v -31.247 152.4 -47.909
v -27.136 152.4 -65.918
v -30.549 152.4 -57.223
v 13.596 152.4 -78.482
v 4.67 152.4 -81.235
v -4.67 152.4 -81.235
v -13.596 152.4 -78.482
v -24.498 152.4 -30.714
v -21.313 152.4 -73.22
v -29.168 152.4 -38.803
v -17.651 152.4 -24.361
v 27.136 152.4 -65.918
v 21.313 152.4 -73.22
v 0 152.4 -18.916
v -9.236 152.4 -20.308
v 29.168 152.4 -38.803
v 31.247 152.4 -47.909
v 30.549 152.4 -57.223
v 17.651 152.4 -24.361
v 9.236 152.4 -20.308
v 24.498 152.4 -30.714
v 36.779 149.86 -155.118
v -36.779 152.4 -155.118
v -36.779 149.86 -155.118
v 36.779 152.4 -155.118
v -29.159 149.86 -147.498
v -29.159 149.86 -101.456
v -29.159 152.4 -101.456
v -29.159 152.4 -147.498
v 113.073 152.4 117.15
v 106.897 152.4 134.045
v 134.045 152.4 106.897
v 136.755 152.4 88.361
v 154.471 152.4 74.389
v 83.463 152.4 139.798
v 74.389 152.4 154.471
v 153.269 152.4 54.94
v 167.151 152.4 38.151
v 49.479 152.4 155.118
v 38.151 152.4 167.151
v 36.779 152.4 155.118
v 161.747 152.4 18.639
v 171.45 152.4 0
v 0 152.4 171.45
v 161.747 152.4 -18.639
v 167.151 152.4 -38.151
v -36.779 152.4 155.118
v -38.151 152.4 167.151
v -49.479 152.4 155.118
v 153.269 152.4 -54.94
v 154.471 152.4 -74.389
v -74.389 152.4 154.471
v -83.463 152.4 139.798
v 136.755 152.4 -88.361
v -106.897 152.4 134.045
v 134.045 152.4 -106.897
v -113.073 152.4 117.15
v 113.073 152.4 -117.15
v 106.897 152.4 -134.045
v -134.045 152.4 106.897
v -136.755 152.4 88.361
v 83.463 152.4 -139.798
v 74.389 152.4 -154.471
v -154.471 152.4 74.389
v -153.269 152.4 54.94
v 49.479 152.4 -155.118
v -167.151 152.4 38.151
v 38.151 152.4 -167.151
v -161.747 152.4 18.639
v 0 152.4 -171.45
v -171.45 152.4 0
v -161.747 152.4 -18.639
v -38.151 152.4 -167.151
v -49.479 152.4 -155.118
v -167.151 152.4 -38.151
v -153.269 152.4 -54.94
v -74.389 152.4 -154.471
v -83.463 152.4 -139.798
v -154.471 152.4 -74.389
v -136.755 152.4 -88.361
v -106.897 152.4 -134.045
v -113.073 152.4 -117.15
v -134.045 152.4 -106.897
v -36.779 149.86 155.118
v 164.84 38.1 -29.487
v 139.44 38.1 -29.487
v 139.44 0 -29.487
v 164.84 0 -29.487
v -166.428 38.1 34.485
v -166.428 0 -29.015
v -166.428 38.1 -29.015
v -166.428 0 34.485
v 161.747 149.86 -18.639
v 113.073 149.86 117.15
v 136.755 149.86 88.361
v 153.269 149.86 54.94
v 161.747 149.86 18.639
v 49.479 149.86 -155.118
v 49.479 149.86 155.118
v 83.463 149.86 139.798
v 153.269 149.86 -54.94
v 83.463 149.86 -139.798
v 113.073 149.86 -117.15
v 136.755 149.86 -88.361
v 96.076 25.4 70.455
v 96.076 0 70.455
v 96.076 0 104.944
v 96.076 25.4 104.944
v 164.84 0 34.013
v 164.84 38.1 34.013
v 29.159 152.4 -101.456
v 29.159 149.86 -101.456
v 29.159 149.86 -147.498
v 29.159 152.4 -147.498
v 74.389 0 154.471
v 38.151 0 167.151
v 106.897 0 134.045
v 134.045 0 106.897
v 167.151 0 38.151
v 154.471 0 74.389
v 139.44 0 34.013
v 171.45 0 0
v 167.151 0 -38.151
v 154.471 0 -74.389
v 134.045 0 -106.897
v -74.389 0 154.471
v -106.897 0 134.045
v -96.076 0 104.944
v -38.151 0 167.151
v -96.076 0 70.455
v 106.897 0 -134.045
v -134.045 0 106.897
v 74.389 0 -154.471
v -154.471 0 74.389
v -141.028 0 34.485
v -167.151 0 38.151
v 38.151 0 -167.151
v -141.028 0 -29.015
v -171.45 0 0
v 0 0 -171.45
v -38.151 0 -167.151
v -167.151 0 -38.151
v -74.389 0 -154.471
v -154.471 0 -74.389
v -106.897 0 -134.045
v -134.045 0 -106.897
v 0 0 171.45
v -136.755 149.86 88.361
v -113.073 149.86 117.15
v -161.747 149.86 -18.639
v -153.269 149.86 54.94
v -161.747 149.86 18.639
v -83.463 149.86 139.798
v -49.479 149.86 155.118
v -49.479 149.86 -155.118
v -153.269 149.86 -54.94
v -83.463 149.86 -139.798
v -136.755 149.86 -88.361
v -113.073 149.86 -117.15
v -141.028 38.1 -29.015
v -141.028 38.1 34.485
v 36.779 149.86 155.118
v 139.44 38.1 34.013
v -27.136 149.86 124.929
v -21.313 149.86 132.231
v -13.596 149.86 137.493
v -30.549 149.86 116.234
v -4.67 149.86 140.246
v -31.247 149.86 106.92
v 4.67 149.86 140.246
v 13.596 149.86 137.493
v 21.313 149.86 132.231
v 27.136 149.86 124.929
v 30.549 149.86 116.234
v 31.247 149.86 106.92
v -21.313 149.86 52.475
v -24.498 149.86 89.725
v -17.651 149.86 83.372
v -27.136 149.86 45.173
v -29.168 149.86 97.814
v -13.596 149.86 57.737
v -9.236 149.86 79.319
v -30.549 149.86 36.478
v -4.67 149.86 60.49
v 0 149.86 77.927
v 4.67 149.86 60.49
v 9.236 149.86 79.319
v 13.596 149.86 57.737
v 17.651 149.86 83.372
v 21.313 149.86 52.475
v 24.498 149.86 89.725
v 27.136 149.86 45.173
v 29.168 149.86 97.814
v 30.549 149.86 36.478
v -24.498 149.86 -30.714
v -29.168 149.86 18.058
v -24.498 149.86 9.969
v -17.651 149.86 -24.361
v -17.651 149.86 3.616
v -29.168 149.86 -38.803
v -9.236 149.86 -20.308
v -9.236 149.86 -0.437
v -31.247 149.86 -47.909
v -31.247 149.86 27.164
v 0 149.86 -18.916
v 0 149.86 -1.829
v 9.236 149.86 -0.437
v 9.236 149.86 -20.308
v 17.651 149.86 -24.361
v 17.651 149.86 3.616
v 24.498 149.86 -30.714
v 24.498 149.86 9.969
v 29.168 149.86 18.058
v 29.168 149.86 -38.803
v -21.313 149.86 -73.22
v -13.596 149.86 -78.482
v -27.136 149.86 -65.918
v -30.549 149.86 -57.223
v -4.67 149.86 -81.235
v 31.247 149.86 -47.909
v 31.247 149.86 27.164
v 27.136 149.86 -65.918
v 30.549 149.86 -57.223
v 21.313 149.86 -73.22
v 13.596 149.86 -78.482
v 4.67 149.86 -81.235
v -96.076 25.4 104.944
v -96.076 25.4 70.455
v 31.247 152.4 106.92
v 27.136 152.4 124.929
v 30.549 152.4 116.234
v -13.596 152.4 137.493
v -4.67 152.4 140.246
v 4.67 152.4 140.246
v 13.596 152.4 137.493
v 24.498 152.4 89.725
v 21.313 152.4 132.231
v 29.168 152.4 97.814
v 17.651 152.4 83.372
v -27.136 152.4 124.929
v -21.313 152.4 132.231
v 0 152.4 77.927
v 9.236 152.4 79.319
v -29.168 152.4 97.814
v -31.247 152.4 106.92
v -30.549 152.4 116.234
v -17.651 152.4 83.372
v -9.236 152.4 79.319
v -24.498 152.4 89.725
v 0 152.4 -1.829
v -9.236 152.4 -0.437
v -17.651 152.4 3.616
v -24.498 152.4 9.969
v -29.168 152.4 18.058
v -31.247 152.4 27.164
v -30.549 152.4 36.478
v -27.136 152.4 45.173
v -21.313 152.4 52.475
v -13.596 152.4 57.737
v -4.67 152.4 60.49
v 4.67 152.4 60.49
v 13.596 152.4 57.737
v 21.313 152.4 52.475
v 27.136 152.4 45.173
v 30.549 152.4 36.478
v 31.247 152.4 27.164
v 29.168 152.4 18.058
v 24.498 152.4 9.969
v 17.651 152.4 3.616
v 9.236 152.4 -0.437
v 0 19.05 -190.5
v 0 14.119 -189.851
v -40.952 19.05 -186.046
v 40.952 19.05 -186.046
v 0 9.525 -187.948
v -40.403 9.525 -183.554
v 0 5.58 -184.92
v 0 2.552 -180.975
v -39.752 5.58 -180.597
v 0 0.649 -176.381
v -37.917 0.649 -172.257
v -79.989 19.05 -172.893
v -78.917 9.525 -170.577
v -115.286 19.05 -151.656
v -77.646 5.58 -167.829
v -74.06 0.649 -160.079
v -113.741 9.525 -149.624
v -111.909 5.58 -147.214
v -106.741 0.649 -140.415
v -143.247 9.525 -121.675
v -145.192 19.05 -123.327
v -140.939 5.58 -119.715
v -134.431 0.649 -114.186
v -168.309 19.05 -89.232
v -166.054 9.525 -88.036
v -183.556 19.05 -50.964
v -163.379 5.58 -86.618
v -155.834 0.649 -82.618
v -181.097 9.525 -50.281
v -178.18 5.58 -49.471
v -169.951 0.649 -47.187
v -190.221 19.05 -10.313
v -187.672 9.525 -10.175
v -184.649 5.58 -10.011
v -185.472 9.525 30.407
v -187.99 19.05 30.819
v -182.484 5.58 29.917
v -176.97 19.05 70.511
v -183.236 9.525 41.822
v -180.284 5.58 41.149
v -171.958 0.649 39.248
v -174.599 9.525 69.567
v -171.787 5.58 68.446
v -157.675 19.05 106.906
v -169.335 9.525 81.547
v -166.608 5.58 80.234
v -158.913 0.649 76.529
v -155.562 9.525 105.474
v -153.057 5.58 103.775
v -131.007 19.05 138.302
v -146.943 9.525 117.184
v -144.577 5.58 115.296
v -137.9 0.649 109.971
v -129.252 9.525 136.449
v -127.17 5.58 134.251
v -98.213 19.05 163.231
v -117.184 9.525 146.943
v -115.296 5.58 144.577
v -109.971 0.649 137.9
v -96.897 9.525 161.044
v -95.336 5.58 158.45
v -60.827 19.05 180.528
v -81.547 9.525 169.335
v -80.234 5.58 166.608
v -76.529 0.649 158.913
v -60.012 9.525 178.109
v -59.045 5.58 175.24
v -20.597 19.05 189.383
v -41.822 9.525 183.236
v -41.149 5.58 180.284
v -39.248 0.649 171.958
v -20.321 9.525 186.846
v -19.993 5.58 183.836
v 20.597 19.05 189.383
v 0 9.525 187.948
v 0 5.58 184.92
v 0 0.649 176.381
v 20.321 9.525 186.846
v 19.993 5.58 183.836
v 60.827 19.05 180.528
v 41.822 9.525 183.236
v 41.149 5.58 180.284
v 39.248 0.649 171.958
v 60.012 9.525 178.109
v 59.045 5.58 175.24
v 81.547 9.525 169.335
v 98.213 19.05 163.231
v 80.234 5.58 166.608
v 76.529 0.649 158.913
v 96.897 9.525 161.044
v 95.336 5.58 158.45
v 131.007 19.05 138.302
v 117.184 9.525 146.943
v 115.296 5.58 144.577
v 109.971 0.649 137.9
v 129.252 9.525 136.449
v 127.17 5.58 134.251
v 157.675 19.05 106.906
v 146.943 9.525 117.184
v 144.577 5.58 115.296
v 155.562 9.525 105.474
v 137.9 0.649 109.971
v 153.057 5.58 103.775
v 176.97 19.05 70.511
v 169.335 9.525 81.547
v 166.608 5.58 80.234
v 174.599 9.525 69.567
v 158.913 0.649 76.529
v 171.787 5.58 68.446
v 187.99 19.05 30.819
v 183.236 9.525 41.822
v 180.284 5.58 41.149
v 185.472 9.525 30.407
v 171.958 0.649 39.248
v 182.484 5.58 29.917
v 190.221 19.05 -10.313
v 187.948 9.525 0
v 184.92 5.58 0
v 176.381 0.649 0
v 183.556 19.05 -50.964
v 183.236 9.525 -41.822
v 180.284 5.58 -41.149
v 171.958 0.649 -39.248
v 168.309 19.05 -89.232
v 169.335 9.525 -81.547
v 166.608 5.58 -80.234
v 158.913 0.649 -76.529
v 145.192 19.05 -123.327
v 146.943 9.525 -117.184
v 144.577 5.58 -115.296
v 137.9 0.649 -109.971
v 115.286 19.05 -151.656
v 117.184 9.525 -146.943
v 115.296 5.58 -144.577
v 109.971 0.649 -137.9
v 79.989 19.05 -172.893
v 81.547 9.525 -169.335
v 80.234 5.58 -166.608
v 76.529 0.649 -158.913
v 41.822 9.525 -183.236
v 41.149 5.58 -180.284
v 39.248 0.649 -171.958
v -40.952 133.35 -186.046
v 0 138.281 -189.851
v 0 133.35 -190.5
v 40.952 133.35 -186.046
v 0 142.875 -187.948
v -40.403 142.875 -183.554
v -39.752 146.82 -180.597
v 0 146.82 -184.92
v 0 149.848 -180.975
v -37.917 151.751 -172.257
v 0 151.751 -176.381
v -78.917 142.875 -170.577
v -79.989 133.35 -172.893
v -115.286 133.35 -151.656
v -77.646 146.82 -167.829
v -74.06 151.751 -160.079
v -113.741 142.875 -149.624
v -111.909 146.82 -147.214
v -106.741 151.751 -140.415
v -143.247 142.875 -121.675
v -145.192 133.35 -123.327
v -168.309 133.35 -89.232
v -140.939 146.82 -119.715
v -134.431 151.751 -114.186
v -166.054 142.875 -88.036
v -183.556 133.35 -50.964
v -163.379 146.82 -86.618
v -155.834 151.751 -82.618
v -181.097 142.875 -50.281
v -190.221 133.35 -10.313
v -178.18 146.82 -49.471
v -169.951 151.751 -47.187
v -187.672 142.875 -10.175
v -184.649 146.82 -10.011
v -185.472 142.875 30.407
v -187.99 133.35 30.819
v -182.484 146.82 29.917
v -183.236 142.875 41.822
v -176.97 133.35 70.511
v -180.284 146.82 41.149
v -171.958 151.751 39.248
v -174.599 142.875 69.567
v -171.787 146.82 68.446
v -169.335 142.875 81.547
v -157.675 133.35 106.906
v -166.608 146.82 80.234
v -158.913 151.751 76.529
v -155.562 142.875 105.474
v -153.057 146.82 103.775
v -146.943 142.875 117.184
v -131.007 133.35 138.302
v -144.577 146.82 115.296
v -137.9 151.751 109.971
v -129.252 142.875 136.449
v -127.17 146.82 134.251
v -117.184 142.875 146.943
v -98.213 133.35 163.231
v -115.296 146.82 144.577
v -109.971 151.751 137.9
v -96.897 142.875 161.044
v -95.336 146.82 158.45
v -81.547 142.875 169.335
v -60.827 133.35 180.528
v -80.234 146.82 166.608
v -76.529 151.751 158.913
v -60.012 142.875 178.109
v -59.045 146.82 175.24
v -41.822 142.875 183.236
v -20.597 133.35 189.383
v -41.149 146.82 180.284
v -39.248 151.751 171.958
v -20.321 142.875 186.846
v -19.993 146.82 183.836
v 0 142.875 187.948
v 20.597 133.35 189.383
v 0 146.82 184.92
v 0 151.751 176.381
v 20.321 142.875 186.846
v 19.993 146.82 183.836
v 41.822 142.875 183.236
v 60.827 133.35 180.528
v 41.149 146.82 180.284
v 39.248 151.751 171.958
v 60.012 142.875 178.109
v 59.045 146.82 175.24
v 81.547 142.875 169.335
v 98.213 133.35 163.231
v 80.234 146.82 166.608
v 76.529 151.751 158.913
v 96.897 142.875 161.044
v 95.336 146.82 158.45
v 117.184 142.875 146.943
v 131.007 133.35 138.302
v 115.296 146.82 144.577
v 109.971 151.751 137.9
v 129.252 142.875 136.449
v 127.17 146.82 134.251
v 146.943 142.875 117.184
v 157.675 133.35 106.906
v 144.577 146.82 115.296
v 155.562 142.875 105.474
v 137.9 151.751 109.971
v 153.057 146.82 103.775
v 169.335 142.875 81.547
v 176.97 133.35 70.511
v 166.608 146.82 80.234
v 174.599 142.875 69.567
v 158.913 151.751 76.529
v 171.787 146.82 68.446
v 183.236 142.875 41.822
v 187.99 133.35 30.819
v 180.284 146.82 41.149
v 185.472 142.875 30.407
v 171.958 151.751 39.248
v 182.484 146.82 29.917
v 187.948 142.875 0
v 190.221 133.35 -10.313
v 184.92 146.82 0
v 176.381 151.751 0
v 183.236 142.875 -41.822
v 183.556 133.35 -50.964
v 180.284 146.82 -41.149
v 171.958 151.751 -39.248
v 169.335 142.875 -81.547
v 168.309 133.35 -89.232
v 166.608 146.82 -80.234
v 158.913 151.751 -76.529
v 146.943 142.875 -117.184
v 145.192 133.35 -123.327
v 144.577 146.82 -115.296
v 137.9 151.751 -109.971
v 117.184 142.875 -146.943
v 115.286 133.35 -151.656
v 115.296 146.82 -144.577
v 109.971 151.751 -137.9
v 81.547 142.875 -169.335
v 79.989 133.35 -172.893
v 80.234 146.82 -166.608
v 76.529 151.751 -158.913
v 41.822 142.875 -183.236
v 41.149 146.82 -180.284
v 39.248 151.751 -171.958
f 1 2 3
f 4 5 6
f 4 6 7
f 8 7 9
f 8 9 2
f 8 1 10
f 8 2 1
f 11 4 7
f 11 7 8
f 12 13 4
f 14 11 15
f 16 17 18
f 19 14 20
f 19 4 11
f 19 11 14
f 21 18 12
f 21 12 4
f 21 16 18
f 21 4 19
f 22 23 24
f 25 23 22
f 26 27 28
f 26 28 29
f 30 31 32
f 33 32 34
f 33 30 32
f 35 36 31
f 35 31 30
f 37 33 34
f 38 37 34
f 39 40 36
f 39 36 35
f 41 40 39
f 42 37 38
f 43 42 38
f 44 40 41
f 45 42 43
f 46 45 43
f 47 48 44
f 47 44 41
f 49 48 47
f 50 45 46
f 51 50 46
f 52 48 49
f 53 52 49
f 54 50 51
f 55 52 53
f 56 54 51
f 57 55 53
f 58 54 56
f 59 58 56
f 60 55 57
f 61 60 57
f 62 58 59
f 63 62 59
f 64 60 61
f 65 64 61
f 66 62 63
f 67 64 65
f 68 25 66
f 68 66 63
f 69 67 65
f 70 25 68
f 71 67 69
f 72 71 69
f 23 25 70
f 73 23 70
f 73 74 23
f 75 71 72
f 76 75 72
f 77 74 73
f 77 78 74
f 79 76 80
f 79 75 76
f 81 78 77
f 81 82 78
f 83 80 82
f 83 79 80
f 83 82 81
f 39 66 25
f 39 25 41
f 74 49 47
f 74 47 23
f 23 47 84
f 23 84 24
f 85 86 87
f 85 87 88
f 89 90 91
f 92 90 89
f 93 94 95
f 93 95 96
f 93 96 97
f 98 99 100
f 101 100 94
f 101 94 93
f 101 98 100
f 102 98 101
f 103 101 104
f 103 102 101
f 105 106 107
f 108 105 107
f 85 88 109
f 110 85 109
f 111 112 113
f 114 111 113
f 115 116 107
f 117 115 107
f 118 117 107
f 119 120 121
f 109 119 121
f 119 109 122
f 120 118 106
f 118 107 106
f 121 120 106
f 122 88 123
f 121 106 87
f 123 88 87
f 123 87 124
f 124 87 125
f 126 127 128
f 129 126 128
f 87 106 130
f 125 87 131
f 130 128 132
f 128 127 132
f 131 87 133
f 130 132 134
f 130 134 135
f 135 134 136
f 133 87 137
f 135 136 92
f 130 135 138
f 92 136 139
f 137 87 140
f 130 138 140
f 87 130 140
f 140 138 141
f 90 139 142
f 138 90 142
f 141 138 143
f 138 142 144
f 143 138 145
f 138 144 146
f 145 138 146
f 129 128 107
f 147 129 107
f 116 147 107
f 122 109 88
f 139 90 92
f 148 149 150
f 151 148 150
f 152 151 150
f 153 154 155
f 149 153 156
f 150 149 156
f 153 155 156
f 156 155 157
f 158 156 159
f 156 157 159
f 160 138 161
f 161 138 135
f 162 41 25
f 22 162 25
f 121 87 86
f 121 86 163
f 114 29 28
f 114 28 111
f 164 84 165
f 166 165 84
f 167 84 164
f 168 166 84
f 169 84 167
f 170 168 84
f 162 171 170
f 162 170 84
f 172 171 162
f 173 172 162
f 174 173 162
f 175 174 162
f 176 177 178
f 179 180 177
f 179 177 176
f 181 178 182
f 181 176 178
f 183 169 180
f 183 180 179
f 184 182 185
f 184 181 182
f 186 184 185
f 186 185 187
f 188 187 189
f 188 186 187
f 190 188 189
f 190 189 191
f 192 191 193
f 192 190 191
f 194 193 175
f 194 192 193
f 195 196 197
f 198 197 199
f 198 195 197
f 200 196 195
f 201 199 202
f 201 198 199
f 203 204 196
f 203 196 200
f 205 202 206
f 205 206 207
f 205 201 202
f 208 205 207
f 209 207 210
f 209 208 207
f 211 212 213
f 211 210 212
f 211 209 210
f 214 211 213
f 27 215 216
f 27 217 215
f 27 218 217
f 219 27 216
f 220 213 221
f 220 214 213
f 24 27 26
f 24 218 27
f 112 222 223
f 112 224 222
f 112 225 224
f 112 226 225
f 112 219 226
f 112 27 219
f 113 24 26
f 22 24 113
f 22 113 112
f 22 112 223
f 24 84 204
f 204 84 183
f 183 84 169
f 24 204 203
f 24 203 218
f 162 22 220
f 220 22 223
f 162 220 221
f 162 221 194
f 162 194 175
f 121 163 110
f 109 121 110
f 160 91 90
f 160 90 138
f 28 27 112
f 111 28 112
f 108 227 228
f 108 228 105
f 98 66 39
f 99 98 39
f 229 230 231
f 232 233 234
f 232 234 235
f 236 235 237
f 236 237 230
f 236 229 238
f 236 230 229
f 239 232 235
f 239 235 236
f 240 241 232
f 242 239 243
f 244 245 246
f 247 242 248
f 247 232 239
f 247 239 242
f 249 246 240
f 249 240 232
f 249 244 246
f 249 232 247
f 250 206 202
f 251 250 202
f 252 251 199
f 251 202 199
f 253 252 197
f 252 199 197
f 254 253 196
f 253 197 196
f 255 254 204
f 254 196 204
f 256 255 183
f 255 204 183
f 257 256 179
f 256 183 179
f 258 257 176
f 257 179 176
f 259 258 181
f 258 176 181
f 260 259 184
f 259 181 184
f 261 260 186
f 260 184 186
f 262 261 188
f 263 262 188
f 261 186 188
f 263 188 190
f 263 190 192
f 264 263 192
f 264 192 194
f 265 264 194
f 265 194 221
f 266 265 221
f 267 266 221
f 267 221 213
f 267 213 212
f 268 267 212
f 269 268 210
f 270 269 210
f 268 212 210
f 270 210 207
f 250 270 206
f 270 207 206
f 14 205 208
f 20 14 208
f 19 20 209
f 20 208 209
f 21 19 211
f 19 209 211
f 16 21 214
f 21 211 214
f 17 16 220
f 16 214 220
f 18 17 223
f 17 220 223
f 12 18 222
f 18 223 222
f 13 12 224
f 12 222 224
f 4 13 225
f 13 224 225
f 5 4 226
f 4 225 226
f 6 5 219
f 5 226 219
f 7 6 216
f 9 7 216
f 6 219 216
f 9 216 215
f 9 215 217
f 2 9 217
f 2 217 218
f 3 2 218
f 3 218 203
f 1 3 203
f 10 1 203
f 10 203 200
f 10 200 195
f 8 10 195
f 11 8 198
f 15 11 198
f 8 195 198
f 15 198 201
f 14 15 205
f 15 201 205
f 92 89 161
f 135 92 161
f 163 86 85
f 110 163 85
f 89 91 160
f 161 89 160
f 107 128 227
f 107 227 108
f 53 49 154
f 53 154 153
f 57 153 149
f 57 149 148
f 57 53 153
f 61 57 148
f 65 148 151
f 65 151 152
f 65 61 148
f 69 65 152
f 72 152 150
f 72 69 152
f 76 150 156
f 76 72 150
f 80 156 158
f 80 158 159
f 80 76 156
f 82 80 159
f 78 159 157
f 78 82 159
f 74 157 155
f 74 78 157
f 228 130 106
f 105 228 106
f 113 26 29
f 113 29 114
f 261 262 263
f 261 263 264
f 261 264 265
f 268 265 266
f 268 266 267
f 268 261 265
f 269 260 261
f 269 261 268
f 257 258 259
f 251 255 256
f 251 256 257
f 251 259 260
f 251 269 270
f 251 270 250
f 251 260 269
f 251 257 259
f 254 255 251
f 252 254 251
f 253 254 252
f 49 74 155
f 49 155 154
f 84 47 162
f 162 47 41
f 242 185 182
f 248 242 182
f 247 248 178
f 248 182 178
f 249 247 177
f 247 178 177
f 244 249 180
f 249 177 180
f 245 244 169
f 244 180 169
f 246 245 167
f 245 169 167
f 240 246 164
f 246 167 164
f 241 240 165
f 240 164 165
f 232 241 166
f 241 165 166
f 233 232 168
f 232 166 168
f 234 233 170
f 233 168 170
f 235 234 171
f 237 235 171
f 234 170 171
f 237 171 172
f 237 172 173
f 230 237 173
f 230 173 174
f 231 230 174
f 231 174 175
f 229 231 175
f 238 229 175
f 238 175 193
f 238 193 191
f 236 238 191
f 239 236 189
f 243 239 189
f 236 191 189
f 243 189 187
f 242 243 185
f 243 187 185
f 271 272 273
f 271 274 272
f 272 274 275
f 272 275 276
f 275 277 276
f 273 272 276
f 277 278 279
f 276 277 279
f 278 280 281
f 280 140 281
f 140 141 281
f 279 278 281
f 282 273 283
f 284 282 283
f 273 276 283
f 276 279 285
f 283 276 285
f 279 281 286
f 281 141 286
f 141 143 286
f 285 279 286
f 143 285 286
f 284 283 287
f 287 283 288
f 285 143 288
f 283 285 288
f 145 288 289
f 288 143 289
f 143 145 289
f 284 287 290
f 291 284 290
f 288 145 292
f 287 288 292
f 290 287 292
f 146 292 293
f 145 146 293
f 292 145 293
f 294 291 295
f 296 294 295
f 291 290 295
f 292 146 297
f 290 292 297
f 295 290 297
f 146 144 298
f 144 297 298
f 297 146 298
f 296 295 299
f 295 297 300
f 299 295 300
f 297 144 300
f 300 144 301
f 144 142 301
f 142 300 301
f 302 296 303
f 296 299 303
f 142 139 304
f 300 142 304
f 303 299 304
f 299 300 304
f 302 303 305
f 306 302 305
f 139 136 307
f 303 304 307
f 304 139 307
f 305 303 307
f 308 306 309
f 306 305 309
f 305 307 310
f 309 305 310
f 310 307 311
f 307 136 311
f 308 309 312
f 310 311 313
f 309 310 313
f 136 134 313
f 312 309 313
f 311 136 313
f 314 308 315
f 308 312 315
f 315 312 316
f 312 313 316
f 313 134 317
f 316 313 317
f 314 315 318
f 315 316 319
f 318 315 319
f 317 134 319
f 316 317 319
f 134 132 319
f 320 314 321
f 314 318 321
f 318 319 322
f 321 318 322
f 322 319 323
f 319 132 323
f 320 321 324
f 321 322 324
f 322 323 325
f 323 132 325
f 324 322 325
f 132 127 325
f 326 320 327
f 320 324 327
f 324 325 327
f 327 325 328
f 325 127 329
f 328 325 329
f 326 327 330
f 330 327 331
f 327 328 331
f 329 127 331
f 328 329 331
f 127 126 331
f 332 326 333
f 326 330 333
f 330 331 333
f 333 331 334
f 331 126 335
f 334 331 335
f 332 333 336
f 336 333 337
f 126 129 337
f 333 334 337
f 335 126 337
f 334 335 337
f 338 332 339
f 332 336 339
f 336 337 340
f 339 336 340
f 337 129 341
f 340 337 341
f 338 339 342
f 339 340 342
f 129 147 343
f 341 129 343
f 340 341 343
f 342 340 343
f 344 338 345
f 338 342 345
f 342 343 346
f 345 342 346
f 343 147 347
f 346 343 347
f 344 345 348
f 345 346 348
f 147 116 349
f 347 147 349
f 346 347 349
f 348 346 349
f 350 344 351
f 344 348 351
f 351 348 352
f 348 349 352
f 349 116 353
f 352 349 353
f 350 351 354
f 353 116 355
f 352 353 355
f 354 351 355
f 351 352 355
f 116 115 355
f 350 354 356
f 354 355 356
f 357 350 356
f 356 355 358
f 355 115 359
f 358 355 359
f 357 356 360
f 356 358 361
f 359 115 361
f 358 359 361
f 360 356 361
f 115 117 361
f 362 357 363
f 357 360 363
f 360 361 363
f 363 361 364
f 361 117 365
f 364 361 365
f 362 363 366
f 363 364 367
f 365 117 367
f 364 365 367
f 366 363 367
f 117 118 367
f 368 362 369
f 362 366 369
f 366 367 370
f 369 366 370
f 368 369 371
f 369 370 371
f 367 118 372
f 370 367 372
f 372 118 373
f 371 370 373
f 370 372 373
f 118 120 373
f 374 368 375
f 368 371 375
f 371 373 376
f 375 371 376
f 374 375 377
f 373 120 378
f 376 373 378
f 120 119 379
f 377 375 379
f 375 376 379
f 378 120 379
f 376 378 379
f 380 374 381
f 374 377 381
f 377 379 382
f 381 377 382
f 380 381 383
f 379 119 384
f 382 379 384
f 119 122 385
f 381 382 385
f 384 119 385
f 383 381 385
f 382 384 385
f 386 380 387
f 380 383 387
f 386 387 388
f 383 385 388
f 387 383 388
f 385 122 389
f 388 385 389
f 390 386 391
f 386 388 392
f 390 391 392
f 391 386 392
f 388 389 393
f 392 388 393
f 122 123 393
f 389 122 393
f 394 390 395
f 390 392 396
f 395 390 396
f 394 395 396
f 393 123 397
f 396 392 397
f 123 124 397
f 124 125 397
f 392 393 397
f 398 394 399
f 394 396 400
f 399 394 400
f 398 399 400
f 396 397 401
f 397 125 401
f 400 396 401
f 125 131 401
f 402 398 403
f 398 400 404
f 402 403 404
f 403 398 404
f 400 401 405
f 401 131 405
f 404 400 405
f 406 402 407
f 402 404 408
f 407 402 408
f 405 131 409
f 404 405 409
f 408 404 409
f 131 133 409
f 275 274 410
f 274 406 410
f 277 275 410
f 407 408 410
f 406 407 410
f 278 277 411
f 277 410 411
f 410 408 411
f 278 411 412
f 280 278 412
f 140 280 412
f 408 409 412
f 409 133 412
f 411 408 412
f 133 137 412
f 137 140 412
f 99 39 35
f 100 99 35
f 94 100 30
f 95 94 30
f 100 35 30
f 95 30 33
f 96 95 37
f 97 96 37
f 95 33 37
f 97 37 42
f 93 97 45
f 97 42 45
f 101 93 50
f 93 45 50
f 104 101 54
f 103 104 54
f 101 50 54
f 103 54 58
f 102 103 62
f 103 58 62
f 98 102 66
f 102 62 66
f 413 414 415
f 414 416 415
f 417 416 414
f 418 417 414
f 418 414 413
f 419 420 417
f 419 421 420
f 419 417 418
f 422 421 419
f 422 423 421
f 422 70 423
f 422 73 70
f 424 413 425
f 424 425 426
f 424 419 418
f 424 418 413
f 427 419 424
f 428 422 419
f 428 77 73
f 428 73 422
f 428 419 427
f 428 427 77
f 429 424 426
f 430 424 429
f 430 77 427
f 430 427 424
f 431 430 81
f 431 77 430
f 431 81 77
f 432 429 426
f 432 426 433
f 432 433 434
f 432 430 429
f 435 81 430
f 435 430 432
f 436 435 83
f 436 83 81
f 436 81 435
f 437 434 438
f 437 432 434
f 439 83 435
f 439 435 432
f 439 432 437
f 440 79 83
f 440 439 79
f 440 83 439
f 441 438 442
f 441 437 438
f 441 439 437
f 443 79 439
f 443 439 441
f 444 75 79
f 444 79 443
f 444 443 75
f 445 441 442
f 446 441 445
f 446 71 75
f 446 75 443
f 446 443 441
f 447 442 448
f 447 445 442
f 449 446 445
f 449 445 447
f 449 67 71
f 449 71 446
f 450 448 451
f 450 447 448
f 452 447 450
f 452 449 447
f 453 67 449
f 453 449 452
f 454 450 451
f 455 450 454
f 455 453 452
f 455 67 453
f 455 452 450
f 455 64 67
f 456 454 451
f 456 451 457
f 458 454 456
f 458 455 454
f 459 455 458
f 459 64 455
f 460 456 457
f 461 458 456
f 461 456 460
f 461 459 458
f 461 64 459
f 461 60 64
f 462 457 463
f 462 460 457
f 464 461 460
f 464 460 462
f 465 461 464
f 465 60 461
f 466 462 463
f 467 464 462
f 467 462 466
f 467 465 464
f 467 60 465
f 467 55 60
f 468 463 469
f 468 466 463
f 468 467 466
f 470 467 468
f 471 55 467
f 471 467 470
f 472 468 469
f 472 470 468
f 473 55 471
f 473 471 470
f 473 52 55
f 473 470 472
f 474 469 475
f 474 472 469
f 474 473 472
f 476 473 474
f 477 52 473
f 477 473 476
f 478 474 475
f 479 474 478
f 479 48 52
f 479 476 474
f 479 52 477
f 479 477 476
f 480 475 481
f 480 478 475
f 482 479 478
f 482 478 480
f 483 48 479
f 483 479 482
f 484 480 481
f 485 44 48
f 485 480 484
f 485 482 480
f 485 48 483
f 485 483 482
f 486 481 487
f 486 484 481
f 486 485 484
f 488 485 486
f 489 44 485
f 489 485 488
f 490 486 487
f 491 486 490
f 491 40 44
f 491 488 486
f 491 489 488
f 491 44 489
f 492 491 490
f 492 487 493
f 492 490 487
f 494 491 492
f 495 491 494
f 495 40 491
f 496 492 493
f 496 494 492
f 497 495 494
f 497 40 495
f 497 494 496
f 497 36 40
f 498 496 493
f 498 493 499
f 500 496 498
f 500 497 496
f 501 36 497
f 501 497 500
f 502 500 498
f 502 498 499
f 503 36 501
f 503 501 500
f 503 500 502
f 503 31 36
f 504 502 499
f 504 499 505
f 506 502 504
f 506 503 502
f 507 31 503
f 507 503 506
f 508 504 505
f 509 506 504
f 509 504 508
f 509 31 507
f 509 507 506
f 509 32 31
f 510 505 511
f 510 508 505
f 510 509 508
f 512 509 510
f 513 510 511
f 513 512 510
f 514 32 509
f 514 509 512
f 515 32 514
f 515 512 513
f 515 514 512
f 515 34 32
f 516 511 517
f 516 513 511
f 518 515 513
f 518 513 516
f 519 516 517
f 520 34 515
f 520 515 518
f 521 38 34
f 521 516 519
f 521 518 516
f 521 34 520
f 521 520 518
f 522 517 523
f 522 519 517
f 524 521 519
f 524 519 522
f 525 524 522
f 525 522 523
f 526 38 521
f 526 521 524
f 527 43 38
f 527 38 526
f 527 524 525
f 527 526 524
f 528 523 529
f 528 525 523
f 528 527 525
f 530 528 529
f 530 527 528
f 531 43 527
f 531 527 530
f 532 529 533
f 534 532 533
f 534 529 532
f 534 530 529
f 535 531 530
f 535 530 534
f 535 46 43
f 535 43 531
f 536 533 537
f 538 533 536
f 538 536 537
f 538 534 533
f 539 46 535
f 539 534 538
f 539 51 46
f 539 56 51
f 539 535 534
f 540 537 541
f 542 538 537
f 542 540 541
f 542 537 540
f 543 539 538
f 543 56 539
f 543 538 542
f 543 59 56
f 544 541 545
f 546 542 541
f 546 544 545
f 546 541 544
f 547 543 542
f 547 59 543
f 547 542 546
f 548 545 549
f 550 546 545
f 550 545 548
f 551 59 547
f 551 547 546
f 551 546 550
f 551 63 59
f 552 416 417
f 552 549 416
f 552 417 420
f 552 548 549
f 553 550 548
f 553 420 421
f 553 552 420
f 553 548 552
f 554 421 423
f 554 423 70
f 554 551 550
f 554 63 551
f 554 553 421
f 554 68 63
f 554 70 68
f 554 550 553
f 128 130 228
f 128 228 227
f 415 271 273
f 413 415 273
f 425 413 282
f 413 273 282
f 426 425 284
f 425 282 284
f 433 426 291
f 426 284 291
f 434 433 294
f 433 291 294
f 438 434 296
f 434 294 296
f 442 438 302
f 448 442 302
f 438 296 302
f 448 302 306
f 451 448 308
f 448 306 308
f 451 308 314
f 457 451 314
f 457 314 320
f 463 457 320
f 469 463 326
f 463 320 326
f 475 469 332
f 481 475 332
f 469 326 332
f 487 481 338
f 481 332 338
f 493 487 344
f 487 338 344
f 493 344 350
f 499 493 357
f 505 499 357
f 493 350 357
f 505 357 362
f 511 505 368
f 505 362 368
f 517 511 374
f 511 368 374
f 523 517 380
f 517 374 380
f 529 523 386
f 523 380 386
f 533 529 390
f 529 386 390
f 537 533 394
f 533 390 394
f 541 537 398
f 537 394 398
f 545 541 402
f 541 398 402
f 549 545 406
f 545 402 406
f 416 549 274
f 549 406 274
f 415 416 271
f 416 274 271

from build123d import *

# Parameters (mm, degrees)
SKETCH1_R           = 190.5
BOSS_EXTRUDE1_DEPTH = 152.4
SKETCH4_W           = 73.557387936
SKETCH4_H           = 310.235544462
CUT_EXTRUDE2_DEPTH  = 2.54
SKETCH5_R           = 31.334472959
SKETCH5_W           = 58.317387936
SKETCH5_H           = 46.041460357
BOSS_EXTRUDE3_DEPTH = 2.54
SKETCH6_W           = 25.4
SKETCH6_H           = 63.5
CUT_EXTRUDE3_DEPTH  = 38.1
FILLET3_R           = 19.05
SKETCH8_W           = 192.151300236
SKETCH8_H           = 34.488694915
CUT_EXTRUDE4_DEPTH  = 25.4


with BuildPart() as part:
    # Sketch1 → Boss-Extrude1 (new body)
    with BuildSketch(Plane(origin=(0, 0, 0), x_dir=(1, 0, 0), z_dir=(0, 1, 0))):
        with Locations(Location((0, 0, 0), (0, 0, 90))):
            Circle(SKETCH1_R)
    extrude(amount=BOSS_EXTRUDE1_DEPTH)

    # Sketch4 → Cut-Extrude2 (cut)
    with BuildSketch(Plane(origin=(0, 152.4, 0), x_dir=(1, 0, 0), z_dir=(0, 1, 0))):
        with BuildLine():
            Line((-49.478693968, 155.117772231), (-49.478693968, -155.117772231))
            ThreePointArc((-49.478693968, -155.117772231), (-162.817887281, 0), (-49.478693968, 155.117772231))
        make_face()
        with BuildLine():
            Line((49.478693968, 155.117772231), (49.478693968, -155.117772231))
            ThreePointArc((49.478693968, -155.117772231), (162.817887281, 0), (49.478693968, 155.117772231))
        make_face()
        Rectangle(SKETCH4_W, SKETCH4_H)
    extrude(amount=-CUT_EXTRUDE2_DEPTH, mode=Mode.SUBTRACT)

    # Sketch5 → Boss-Extrude3 (add)
    with BuildSketch(Plane(origin=(0, 149.86, 0), x_dir=(1, 0, 0), z_dir=(0, 1, 0))):
        with Locations(Location((0, 50.250313703, 0), (0, 0, 270))):
            Circle(SKETCH5_R)
        with Locations(Location((0, -29.505686297, 0), (0, 0, 90))):
            Circle(SKETCH5_R)
        with Locations(Location((0, -109.261686297, 0), (0, 0, 90))):
            Circle(SKETCH5_R)
        with Locations((0, 124.477042052)):
            Rectangle(SKETCH5_W, SKETCH5_H)
    extrude(amount=BOSS_EXTRUDE3_DEPTH)

    # Sketch6 → Cut-Extrude3 (cut)
    with BuildSketch(Plane.XZ):
        with Locations((-153.728334256, 2.735150341)):
            Rectangle(SKETCH6_W, SKETCH6_H)
        with Locations((152.139955728, 2.262697534)):
            Rectangle(SKETCH6_W, SKETCH6_H)
    extrude(amount=-CUT_EXTRUDE3_DEPTH, mode=Mode.SUBTRACT)

    # Fillet3
    fillet3_edges = [part.edges().sort_by_distance(p)[0] for p in [
        (0, 0, 190.5),
        (0, 152.4, 190.5),
    ]]
    fillet(fillet3_edges, radius=FILLET3_R)

    # Sketch8 → Cut-Extrude4 (cut)
    with BuildSketch(Plane.XZ):
        with Locations((0, 87.69982421)):
            Rectangle(SKETCH8_W, SKETCH8_H)
    extrude(amount=-CUT_EXTRUDE4_DEPTH, mode=Mode.SUBTRACT)


solid = part.part
